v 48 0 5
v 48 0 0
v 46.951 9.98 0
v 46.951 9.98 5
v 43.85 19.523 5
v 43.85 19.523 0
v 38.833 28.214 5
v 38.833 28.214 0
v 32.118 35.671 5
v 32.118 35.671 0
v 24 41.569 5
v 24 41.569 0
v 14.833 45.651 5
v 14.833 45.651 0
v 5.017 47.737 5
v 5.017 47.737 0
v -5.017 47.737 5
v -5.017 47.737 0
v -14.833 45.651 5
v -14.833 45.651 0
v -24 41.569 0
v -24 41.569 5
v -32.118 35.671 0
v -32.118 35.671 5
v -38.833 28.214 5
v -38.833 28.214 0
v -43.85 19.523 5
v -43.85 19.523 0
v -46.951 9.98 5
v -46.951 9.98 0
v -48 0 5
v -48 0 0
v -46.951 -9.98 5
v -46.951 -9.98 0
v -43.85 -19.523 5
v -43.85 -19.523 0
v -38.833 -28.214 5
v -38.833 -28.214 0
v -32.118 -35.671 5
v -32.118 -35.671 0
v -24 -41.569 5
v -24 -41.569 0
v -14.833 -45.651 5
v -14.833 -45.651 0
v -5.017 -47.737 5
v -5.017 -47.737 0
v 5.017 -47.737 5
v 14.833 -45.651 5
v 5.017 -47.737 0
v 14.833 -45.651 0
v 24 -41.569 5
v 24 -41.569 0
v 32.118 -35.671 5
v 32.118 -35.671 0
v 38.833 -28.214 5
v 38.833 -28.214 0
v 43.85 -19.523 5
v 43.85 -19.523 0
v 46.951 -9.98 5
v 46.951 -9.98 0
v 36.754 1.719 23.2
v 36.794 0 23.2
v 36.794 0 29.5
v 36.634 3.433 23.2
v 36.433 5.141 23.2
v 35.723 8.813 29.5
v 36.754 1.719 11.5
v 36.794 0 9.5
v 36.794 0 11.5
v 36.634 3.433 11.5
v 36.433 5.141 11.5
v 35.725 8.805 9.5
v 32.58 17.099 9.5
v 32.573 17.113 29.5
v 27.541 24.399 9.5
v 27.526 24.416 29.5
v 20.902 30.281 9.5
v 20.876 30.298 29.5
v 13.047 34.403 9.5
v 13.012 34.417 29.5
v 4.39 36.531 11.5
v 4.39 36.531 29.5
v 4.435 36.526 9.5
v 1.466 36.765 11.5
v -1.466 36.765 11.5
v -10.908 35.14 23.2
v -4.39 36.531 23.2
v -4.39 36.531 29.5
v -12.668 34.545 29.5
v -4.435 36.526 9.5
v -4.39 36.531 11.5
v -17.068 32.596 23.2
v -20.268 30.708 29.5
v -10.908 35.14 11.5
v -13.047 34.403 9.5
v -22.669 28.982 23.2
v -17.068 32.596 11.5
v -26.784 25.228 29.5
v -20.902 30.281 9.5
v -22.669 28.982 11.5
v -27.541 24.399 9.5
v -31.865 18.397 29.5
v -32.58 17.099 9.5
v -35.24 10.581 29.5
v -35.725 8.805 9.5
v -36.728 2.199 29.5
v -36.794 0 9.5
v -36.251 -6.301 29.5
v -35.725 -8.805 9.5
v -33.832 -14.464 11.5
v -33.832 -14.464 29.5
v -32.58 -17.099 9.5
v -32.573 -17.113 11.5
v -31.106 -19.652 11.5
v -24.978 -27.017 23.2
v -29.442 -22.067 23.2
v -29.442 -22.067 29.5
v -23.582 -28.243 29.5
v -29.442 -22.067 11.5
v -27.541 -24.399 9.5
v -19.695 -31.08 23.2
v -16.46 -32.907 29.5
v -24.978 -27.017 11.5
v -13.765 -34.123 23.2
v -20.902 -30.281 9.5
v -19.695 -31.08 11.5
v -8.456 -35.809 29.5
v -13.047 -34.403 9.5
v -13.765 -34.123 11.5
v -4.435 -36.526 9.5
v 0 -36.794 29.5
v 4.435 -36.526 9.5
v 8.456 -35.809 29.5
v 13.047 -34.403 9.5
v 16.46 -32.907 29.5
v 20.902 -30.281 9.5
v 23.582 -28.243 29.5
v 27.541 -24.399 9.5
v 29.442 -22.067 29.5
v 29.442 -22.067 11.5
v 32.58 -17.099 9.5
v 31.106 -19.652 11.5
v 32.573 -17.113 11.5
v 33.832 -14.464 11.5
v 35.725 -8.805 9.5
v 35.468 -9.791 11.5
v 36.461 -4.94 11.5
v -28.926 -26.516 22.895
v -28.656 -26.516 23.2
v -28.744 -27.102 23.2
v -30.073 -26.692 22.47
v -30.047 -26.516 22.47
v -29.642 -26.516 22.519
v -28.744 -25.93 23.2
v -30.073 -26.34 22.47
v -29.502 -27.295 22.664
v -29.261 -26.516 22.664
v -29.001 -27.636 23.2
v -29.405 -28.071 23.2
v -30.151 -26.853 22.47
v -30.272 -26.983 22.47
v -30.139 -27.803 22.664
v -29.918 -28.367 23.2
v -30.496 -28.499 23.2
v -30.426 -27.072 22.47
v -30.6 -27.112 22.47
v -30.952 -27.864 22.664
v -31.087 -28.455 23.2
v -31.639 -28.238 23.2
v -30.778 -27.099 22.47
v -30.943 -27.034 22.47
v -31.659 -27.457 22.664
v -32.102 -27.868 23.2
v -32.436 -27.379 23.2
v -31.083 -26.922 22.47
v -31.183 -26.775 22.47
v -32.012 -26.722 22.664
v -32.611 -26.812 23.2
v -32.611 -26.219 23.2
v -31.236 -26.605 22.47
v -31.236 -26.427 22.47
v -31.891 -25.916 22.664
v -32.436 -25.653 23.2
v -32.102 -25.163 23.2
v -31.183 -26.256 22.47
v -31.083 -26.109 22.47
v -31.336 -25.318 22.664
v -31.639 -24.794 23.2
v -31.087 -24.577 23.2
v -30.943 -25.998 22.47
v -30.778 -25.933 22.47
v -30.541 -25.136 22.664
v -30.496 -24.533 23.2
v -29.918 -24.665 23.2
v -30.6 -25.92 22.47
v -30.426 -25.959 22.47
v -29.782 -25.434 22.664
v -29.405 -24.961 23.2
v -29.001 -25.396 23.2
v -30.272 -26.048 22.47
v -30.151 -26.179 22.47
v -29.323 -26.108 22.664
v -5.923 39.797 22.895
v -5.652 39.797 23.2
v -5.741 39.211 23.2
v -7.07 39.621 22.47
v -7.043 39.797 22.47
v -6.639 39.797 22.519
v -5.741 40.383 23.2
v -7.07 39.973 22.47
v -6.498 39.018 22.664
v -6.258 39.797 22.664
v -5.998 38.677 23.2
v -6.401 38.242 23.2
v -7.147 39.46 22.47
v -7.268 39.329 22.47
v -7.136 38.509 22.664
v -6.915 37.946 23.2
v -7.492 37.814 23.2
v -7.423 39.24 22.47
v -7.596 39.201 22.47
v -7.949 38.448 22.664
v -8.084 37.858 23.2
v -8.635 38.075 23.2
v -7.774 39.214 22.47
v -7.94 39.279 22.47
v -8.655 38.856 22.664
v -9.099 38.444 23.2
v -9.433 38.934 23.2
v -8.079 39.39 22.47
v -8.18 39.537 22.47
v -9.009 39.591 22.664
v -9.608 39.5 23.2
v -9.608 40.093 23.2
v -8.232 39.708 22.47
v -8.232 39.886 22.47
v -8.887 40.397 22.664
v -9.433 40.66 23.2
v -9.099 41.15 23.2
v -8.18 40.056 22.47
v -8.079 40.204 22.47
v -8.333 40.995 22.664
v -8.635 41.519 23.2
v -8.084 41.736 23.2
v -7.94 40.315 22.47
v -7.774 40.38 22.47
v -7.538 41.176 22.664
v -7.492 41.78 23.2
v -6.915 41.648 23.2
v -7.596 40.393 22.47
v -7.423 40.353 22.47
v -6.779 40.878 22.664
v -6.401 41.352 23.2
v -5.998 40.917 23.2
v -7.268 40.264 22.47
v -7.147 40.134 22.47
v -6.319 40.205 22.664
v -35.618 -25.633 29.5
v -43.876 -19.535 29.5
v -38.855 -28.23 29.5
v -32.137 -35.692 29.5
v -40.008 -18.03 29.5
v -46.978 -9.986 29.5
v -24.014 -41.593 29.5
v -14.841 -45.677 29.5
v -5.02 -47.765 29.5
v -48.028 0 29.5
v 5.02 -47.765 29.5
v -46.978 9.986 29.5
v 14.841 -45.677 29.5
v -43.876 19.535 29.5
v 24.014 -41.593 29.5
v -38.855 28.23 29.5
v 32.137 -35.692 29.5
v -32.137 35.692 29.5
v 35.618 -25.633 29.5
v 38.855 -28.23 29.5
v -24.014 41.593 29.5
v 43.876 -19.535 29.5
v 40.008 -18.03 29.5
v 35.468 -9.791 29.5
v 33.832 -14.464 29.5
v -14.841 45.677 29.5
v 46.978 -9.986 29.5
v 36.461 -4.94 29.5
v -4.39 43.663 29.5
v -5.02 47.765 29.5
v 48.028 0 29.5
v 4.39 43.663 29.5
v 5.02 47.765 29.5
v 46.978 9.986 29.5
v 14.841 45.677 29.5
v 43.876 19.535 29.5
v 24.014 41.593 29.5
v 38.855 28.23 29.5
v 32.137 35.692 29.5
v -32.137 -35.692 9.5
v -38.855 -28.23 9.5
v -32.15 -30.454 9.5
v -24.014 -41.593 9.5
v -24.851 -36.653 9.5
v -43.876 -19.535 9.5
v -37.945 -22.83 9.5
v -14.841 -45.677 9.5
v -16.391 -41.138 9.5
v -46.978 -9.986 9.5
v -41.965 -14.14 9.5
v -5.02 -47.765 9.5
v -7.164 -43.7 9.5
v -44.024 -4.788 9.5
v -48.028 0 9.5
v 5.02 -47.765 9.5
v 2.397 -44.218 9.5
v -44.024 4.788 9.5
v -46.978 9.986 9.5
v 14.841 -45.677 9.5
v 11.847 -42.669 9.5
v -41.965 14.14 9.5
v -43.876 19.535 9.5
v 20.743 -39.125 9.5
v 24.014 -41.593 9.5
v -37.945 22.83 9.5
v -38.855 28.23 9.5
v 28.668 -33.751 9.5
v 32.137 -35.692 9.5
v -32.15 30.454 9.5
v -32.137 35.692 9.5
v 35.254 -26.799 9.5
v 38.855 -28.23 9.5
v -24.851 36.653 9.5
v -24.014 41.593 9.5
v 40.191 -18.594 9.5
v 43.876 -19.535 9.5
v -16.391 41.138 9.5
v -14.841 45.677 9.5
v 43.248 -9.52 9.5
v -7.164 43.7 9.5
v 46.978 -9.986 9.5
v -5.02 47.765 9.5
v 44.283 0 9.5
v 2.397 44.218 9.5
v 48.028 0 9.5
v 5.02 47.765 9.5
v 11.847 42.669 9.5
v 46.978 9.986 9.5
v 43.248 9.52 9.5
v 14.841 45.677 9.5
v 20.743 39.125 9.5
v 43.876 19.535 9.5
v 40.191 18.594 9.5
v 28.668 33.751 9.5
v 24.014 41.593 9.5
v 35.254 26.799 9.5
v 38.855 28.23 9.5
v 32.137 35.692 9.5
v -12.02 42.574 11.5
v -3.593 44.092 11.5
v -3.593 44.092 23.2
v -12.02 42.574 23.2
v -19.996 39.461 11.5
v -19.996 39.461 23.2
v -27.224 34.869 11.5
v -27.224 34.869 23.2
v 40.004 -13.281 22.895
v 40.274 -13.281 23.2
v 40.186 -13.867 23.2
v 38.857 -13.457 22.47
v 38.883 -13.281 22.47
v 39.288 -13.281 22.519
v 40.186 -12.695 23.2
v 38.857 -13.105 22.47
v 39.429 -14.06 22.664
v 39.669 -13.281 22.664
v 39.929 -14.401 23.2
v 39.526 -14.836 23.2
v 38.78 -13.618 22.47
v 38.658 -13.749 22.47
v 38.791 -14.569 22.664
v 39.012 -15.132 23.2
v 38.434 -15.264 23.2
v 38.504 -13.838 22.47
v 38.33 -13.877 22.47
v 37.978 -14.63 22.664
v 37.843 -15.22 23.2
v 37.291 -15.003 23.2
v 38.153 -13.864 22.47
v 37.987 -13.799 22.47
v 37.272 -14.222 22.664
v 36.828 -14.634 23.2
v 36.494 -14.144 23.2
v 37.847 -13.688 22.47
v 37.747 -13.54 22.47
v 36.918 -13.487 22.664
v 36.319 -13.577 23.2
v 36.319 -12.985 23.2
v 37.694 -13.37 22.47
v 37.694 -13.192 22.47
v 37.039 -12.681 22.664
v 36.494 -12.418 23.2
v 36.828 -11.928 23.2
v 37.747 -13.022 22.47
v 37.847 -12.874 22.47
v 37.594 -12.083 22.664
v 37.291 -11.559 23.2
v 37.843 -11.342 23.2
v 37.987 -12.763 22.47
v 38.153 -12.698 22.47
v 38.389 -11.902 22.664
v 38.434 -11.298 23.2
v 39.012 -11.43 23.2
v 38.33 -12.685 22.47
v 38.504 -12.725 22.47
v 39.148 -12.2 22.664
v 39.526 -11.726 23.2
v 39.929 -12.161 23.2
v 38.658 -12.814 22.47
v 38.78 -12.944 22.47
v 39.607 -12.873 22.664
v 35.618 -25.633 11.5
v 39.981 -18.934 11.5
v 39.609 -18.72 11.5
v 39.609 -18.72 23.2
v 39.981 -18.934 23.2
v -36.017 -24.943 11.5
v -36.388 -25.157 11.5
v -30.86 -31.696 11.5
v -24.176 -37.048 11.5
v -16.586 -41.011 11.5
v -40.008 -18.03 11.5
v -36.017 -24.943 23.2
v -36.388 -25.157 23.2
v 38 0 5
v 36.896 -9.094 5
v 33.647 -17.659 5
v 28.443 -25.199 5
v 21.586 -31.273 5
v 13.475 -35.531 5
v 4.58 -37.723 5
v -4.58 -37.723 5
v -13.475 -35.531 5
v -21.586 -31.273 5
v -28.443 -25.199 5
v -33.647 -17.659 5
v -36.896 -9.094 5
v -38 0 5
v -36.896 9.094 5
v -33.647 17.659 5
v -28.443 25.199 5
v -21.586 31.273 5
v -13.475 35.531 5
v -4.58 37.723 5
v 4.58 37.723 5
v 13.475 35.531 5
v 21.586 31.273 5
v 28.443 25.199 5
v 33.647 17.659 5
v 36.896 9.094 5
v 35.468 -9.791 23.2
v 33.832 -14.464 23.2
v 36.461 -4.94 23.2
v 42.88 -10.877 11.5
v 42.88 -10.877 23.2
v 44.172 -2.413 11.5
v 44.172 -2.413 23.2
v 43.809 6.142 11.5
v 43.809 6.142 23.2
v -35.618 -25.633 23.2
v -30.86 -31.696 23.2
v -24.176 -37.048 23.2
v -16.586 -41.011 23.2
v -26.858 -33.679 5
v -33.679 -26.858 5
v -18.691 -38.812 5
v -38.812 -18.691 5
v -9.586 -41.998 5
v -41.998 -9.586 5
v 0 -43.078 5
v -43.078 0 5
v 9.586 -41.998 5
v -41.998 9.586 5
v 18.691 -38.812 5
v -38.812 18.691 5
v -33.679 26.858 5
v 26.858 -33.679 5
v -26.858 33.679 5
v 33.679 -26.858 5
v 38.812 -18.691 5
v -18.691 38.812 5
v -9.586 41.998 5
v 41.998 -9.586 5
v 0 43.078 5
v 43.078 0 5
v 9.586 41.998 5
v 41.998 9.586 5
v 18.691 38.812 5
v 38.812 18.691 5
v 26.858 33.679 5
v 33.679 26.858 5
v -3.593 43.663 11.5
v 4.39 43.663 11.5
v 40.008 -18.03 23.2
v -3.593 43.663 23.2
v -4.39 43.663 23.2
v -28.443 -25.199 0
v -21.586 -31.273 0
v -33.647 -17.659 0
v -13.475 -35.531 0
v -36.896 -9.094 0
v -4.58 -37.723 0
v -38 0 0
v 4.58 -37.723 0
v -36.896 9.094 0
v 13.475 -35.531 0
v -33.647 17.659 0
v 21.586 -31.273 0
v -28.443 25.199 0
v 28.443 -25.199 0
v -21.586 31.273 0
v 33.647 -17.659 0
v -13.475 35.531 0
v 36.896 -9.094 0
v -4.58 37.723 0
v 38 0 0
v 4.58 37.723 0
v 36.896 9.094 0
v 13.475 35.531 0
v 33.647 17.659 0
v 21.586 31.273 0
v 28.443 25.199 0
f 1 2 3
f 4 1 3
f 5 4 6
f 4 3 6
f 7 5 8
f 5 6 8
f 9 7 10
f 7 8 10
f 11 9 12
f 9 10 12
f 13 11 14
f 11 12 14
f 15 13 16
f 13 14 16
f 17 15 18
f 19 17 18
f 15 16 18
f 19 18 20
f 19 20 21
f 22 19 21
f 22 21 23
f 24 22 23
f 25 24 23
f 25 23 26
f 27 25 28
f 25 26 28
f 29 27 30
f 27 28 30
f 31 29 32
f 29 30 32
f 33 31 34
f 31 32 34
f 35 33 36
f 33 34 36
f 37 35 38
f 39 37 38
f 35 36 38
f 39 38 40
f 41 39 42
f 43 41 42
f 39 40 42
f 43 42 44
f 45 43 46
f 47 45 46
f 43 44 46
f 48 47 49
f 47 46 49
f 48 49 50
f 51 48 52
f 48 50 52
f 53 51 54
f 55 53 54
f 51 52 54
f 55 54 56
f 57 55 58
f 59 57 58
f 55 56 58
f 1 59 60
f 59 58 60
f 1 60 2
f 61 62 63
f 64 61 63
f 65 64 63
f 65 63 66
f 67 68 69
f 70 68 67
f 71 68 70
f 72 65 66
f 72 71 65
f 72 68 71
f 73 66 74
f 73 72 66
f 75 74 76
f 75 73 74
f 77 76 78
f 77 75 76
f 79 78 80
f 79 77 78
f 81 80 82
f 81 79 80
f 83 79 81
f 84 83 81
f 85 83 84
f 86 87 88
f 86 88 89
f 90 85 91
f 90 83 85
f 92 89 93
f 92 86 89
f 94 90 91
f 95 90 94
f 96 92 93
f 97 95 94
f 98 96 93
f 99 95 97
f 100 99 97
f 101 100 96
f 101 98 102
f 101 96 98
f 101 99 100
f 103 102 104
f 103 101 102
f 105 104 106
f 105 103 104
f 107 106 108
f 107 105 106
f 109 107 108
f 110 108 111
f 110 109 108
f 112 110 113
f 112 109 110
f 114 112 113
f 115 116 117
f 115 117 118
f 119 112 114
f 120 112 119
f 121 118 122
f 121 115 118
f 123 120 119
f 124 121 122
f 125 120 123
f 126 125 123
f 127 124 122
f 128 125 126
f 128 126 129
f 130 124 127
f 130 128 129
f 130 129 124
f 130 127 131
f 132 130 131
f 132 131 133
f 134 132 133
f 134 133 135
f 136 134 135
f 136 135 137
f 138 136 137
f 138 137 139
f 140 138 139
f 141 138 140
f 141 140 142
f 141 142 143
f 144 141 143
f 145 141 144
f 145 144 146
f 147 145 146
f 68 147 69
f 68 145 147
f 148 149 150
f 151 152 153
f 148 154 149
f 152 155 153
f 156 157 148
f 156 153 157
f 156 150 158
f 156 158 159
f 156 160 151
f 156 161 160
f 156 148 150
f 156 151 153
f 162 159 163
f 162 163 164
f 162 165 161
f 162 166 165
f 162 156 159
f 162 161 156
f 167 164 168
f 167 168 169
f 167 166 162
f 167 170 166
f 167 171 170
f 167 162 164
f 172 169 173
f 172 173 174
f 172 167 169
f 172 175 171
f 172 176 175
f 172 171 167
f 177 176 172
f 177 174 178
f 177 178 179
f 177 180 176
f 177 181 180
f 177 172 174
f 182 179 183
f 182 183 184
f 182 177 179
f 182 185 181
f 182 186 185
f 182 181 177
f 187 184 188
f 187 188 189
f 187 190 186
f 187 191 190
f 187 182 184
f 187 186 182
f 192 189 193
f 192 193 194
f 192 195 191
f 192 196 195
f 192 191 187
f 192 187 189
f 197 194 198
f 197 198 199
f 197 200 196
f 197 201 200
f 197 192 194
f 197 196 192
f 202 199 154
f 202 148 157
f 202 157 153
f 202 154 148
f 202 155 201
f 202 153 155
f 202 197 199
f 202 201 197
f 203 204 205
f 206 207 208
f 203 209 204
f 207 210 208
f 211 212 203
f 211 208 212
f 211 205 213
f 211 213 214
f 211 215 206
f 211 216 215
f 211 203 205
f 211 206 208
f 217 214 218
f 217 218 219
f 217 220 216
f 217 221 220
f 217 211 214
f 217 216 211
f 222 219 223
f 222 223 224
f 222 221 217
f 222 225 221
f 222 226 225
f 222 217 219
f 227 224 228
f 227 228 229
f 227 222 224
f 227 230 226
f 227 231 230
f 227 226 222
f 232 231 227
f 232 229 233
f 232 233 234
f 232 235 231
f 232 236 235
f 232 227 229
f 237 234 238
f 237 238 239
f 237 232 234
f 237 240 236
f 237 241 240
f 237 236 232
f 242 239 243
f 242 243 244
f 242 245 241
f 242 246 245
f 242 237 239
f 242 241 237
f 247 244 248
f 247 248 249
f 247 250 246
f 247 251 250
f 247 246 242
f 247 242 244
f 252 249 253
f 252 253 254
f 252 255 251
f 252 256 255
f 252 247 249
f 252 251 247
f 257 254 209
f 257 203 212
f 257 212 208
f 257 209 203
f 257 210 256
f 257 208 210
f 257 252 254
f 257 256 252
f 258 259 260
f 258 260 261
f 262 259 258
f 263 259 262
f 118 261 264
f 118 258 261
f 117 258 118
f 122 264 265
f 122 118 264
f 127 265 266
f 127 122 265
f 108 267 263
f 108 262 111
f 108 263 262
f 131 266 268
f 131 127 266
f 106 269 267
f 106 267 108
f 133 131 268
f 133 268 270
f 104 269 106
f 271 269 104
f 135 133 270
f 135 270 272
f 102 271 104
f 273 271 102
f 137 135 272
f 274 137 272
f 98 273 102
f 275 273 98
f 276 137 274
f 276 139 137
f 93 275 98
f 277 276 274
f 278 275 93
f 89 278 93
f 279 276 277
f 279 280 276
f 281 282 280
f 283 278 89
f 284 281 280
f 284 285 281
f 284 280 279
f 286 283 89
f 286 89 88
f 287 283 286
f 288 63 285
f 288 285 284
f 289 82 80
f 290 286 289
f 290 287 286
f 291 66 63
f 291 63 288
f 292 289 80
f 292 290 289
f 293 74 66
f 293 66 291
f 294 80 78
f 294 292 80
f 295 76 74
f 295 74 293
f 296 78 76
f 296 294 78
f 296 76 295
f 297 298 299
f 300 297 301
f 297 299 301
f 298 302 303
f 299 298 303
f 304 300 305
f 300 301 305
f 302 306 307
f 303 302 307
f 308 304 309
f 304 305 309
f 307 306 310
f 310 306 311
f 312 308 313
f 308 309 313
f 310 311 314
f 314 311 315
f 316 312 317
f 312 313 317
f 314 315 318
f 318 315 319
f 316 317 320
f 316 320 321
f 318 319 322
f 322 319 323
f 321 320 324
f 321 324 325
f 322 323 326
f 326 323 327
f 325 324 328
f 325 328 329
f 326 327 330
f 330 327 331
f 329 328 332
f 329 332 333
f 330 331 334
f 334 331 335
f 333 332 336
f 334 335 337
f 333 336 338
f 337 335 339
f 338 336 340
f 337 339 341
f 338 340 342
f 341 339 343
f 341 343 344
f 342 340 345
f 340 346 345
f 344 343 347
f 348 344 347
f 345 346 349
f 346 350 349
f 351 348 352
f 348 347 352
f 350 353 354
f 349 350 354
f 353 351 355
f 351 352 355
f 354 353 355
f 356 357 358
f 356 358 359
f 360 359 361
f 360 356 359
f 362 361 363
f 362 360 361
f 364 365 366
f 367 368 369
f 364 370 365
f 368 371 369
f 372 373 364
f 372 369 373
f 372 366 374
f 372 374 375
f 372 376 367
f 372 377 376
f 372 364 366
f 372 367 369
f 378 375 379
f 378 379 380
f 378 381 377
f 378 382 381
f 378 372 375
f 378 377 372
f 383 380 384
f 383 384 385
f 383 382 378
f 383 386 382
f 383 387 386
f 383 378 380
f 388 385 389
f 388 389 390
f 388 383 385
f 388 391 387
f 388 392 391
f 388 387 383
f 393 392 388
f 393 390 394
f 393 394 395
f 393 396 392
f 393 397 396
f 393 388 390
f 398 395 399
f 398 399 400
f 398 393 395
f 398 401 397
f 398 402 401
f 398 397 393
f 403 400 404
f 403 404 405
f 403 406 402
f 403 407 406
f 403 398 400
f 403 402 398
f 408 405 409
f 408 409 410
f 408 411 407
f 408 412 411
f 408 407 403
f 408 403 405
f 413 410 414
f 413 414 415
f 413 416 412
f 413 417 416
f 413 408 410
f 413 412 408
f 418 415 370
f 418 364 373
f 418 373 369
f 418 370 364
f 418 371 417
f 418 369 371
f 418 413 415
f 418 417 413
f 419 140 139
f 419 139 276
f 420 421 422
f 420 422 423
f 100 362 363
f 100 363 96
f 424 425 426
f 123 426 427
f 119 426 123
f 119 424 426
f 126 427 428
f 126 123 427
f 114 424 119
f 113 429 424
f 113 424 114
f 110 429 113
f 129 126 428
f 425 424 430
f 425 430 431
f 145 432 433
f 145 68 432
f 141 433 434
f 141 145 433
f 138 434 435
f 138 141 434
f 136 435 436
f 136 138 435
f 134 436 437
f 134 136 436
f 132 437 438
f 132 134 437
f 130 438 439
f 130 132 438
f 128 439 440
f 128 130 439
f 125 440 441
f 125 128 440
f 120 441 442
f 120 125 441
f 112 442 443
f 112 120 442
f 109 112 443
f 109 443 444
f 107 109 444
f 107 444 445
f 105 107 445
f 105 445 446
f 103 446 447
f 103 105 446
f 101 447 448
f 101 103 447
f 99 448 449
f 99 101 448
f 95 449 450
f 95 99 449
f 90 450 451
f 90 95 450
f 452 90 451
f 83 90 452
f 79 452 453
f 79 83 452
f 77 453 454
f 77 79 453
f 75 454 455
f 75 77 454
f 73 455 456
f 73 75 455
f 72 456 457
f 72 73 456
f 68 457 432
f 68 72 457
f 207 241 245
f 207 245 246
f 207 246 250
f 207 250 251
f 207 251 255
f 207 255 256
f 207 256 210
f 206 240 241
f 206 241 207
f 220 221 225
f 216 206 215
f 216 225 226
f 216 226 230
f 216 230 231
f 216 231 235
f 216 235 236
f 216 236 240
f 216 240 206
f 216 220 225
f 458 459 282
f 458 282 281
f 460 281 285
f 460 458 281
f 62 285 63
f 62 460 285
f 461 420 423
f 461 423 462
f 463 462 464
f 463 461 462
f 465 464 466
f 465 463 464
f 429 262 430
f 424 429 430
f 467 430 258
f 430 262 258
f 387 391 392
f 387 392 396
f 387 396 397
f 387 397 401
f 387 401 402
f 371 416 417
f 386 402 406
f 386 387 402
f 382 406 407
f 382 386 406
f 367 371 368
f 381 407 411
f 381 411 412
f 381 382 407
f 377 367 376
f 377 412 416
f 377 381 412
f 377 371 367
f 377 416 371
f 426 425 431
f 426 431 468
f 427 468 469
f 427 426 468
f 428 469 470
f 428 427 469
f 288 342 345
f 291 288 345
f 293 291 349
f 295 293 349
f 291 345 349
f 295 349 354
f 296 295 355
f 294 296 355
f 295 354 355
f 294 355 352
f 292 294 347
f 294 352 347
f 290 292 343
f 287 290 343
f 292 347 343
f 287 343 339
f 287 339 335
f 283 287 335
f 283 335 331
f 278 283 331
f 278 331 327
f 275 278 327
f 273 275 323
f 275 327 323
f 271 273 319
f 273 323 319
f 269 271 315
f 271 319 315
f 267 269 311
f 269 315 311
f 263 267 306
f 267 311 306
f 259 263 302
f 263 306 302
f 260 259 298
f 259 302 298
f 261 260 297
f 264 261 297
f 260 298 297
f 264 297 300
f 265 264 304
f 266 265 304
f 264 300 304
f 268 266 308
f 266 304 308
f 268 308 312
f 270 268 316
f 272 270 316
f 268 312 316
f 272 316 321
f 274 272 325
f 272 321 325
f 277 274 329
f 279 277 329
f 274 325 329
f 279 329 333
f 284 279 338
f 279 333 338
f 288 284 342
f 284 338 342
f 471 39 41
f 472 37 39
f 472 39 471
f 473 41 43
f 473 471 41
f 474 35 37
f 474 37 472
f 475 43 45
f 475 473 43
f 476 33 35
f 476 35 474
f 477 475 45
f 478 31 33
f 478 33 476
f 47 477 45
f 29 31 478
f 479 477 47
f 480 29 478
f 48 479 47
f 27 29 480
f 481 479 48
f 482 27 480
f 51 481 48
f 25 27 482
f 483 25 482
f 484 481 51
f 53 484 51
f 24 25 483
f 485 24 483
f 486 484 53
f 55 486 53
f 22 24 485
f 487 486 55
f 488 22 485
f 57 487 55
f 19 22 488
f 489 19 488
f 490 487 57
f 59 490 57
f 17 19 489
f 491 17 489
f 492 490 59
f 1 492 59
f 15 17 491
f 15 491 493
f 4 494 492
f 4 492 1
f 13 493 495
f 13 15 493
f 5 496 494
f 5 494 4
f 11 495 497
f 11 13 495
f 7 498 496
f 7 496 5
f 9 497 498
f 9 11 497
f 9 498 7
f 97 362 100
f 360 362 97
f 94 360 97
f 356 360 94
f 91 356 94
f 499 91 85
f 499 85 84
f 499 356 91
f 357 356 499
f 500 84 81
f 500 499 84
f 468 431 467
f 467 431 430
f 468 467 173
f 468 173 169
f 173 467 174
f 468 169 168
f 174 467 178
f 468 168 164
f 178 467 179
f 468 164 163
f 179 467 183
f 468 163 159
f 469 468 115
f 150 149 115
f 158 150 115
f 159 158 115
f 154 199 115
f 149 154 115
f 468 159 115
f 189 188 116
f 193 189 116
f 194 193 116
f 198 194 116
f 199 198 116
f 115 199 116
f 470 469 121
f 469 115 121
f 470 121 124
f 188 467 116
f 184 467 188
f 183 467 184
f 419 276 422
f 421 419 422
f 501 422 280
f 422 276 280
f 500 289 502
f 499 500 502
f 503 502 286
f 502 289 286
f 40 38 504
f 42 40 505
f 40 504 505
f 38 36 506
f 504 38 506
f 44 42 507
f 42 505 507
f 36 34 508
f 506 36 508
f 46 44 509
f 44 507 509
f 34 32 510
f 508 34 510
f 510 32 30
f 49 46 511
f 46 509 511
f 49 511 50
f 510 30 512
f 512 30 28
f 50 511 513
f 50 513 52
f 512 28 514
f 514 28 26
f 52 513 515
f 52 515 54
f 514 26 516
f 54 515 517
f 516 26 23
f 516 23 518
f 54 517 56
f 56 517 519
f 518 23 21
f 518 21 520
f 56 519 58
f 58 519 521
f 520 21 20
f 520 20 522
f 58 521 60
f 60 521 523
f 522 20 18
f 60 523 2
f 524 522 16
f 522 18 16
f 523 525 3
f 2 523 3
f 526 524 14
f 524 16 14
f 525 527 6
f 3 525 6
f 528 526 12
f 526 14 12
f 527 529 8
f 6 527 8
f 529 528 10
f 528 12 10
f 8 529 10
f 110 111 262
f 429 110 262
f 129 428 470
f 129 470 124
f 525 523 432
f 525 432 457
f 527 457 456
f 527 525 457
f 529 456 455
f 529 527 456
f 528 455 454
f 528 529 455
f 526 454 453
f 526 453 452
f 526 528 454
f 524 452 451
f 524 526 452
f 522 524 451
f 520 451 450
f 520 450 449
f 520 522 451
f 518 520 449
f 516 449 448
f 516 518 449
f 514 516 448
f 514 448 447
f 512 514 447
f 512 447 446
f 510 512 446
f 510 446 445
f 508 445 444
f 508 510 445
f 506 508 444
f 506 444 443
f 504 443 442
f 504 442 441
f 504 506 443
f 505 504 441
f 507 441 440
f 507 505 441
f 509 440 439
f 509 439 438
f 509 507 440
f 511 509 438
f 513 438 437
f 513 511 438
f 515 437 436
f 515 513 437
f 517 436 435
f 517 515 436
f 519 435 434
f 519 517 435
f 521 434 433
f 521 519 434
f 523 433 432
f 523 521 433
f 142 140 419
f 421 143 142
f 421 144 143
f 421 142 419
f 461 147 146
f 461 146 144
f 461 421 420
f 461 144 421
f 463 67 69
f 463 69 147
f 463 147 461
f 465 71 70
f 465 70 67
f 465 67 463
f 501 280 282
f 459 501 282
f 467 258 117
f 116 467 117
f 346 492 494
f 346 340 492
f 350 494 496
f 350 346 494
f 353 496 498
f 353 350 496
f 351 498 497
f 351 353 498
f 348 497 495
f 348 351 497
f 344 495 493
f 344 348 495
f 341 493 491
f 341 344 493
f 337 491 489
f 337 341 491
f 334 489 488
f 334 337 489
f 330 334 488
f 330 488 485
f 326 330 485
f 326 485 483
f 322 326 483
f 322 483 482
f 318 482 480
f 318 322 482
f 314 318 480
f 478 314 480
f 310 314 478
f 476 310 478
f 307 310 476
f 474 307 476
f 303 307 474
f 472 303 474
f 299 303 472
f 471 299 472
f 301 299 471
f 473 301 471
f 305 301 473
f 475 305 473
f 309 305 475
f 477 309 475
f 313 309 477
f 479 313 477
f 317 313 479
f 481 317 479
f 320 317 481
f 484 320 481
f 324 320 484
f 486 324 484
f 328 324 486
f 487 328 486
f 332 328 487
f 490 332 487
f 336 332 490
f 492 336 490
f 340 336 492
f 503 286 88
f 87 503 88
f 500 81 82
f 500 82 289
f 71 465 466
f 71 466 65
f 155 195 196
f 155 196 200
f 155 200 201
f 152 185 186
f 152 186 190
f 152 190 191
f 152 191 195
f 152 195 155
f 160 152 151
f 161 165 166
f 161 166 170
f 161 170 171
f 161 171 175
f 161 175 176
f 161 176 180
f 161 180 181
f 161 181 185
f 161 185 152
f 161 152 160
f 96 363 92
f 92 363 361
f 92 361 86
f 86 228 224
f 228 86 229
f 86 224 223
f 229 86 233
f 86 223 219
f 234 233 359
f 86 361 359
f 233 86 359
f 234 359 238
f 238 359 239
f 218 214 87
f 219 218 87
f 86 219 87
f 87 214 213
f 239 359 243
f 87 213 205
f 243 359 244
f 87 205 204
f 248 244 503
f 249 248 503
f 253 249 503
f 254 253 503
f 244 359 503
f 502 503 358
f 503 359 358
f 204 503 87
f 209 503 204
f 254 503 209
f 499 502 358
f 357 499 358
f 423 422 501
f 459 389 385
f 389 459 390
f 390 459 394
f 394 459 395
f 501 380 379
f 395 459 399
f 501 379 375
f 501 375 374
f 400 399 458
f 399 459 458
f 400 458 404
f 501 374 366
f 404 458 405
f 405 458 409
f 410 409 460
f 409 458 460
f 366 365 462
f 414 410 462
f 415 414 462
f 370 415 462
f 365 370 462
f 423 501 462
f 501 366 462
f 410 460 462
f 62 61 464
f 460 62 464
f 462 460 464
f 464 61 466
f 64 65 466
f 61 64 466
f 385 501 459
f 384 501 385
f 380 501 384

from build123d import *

# Parameters (mm, degrees)
F0_R      = 48
F0_R_2    = 42
F0_R_3    = 38
F1_DEPTH  = 5
F2_R      = 43.0776189128
F2_R_2    = 38
F3_DEPTH  = 4.5
F3_TAPER  = -15
F4_R      = 48.0278860385
F4_R_2    = 44.2833902788
F4_R_3    = 36.7942286341
F5_DEPTH  = 20
F7_DEPTH  = 18
F9_DEPTH  = 11.7
F10_R     = 1.9886860781
F11_DEPTH = 0.73


# Not quite as in the source:
# - a fillet or chamfer that OpenCascade refuses, or shapes differently, is made with other operations: its cross-section is extruded or revolved along the edge and cut away or added


with BuildPart() as f1:
    # F0 (on Top) → F1 (new body)
    with BuildSketch(Plane.XY):
        Circle(F0_R)
        Circle(F0_R_2, mode=Mode.SUBTRACT)
        Circle(F0_R_2)
        Circle(F0_R_3, mode=Mode.SUBTRACT)
    extrude(amount=F1_DEPTH)

    # F2 (on face) → F3 (join)
    with BuildSketch(Plane.XY.offset(5)):
        Circle(F2_R)
        Circle(F2_R_2, mode=Mode.SUBTRACT)
    extrude(amount=F3_DEPTH, taper=F3_TAPER)

    # F4 (on face) → F5 (join)
    with BuildSketch(Plane.XY.offset(9.5)):
        Circle(F4_R)
        Circle(F4_R_2, mode=Mode.SUBTRACT)
        Circle(F4_R_2)
        Circle(F4_R_3, mode=Mode.SUBTRACT)
    extrude(amount=F5_DEPTH)

    # F6 (on face) → F7 (cut)
    with BuildSketch(Plane.XY.offset(29.5)):
        Polygon((4.3897340074, 43.6625890434), (0, 43.6625890434), (-4.3897340074, 43.6625890434), (-4.3897340074, 34.0553857386), (0, 34.0553857386), (4.3897340074, 34.0553857386), align=None)
        Polygon((-35.6180443029, -25.632915688), (-27.2979621816, -20.8293140356), (-29.4928291853, -17.0276928693), (-31.687696189, -13.226071703), (-40.0077783103, -18.0296733554), (-37.8129113066, -21.8312945217), align=None)
        Polygon((40.0077783103, -18.0296733554), (31.687696189, -13.226071703), (29.4928291853, -17.0276928693), (27.2979621816, -20.8293140356), (35.6180443029, -25.632915688), (37.8129113066, -21.8312945217), align=None)
    extrude(amount=-F7_DEPTH, mode=Mode.SUBTRACT)

    # F8 (on face) → F9 (cut)
    with BuildSketch(Plane.XY.offset(11.5)):
        with BuildLine():
            ThreePointArc((-22.6687016251, 28.98180856), (-14.0459580236, 34.0077391776), (-4.3897340074, 36.5314316188))
            Line((-4.3897340074, 36.5314316188), (-4.3897340074, 43.6625890434))
            Line((-4.3897340074, 43.6625890434), (-3.592736461, 43.6625890434))
            Line((-3.592736461, 43.6625890434), (-3.592736461, 44.0917754576))
            ThreePointArc((-3.592736461, 44.0917754576), (-16.0835403712, 41.210582954), (-27.2238685762, 34.869089435))
            Line((-27.2238685762, 34.869089435), (-22.6687016251, 28.98180856))
        make_face()
        with BuildLine():
            ThreePointArc((36.4333332731, 5.1407671981), (36.7038939019, 2.5767097647), (36.7942286341, 0))
            ThreePointArc((36.7942286341, 0), (35.9635026363, -7.7744285261), (33.5088362695, -15.1978009146))
            Line((33.5088362695, -15.1978009146), (39.9809658747, -18.9344866844))
            ThreePointArc((39.9809658747, -18.9344866844), (43.7311819285, -6.6765369327), (43.8094515456, 6.1420170588))
            Line((43.8094515456, 6.1420170588), (36.4333332731, 5.1407671981))
        make_face()
        with BuildLine():
            Line((-16.5855829694, -41.0111064938), (-13.764631648, -34.1225757581))
            ThreePointArc((-13.764631648, -34.1225757581), (-22.7450346913, -28.9219407659), (-29.9160998084, -21.4206030033))
            Line((-29.9160998084, -21.4206030033), (-36.3882294137, -25.1572887731))
            ThreePointArc((-36.3882294137, -25.1572887731), (-27.6476415573, -34.5340460213), (-16.5855829694, -41.0111064938))
        make_face()
    extrude(amount=F9_DEPTH, mode=Mode.SUBTRACT)

    # F10 (on face) → F11 (join)
    with BuildSketch(Plane(origin=(0, 0, 23.2), x_dir=(1, 0, 0), z_dir=(0, 0, -1))):
        with Locations((-30.6445658207, 26.5157744288)):
            Circle(F10_R)
        with Locations((38.2856171667, 13.2810852742)):
            Circle(F10_R)
        with Locations((-7.6410513461, -39.7968597031)):
            Circle(F10_R)
    extrude(amount=F11_DEPTH)

    # F12: fillet of radius 1.6899494937 on 3 edges, made by hand

    # F12_s1 → F12_t2 (revolve, cut)
    with BuildSketch(Plane.XZ.offset(26.5157744288)):
        with BuildLine():
            ThreePointArc((-28.6558797426, 23.2), (-29.2613300231, 22.6635879979), (-30.0467162753, 22.47))
            Line((-30.0467162753, 22.47), (-28.6558797426, 22.47))
            Line((-28.6558797426, 22.47), (-28.6558797426, 23.2))
        make_face()
    revolve(axis=Axis((-30.6445658207, -26.5157744288, 22.47), (0, 0, -1)), mode=Mode.SUBTRACT)

    # F12_s3 → F12_t4 (revolve, cut)
    with BuildSketch(Plane.XZ.offset(13.2810852742)):
        with BuildLine():
            ThreePointArc((40.2743032449, 23.2), (39.6688529644, 22.6635879979), (38.8834667121, 22.47))
            Line((38.8834667121, 22.47), (40.2743032449, 22.47))
            Line((40.2743032449, 22.47), (40.2743032449, 23.2))
        make_face()
    revolve(axis=Axis((38.2856171667, -13.2810852742, 22.47), (0, 0, -1)), mode=Mode.SUBTRACT)

    # F12_s5 → F12_t6 (revolve, cut)
    with BuildSketch(Plane.XZ.offset(-39.7968597031)):
        with BuildLine():
            ThreePointArc((-5.6523652679, 23.2), (-6.2578155484, 22.6635879979), (-7.0432018006, 22.47))
            Line((-7.0432018006, 22.47), (-5.6523652679, 22.47))
            Line((-5.6523652679, 22.47), (-5.6523652679, 23.2))
        make_face()
    revolve(axis=Axis((-7.6410513461, 39.7968597031, 22.47), (0, 0, -1)), mode=Mode.SUBTRACT)


solid = f1.part
